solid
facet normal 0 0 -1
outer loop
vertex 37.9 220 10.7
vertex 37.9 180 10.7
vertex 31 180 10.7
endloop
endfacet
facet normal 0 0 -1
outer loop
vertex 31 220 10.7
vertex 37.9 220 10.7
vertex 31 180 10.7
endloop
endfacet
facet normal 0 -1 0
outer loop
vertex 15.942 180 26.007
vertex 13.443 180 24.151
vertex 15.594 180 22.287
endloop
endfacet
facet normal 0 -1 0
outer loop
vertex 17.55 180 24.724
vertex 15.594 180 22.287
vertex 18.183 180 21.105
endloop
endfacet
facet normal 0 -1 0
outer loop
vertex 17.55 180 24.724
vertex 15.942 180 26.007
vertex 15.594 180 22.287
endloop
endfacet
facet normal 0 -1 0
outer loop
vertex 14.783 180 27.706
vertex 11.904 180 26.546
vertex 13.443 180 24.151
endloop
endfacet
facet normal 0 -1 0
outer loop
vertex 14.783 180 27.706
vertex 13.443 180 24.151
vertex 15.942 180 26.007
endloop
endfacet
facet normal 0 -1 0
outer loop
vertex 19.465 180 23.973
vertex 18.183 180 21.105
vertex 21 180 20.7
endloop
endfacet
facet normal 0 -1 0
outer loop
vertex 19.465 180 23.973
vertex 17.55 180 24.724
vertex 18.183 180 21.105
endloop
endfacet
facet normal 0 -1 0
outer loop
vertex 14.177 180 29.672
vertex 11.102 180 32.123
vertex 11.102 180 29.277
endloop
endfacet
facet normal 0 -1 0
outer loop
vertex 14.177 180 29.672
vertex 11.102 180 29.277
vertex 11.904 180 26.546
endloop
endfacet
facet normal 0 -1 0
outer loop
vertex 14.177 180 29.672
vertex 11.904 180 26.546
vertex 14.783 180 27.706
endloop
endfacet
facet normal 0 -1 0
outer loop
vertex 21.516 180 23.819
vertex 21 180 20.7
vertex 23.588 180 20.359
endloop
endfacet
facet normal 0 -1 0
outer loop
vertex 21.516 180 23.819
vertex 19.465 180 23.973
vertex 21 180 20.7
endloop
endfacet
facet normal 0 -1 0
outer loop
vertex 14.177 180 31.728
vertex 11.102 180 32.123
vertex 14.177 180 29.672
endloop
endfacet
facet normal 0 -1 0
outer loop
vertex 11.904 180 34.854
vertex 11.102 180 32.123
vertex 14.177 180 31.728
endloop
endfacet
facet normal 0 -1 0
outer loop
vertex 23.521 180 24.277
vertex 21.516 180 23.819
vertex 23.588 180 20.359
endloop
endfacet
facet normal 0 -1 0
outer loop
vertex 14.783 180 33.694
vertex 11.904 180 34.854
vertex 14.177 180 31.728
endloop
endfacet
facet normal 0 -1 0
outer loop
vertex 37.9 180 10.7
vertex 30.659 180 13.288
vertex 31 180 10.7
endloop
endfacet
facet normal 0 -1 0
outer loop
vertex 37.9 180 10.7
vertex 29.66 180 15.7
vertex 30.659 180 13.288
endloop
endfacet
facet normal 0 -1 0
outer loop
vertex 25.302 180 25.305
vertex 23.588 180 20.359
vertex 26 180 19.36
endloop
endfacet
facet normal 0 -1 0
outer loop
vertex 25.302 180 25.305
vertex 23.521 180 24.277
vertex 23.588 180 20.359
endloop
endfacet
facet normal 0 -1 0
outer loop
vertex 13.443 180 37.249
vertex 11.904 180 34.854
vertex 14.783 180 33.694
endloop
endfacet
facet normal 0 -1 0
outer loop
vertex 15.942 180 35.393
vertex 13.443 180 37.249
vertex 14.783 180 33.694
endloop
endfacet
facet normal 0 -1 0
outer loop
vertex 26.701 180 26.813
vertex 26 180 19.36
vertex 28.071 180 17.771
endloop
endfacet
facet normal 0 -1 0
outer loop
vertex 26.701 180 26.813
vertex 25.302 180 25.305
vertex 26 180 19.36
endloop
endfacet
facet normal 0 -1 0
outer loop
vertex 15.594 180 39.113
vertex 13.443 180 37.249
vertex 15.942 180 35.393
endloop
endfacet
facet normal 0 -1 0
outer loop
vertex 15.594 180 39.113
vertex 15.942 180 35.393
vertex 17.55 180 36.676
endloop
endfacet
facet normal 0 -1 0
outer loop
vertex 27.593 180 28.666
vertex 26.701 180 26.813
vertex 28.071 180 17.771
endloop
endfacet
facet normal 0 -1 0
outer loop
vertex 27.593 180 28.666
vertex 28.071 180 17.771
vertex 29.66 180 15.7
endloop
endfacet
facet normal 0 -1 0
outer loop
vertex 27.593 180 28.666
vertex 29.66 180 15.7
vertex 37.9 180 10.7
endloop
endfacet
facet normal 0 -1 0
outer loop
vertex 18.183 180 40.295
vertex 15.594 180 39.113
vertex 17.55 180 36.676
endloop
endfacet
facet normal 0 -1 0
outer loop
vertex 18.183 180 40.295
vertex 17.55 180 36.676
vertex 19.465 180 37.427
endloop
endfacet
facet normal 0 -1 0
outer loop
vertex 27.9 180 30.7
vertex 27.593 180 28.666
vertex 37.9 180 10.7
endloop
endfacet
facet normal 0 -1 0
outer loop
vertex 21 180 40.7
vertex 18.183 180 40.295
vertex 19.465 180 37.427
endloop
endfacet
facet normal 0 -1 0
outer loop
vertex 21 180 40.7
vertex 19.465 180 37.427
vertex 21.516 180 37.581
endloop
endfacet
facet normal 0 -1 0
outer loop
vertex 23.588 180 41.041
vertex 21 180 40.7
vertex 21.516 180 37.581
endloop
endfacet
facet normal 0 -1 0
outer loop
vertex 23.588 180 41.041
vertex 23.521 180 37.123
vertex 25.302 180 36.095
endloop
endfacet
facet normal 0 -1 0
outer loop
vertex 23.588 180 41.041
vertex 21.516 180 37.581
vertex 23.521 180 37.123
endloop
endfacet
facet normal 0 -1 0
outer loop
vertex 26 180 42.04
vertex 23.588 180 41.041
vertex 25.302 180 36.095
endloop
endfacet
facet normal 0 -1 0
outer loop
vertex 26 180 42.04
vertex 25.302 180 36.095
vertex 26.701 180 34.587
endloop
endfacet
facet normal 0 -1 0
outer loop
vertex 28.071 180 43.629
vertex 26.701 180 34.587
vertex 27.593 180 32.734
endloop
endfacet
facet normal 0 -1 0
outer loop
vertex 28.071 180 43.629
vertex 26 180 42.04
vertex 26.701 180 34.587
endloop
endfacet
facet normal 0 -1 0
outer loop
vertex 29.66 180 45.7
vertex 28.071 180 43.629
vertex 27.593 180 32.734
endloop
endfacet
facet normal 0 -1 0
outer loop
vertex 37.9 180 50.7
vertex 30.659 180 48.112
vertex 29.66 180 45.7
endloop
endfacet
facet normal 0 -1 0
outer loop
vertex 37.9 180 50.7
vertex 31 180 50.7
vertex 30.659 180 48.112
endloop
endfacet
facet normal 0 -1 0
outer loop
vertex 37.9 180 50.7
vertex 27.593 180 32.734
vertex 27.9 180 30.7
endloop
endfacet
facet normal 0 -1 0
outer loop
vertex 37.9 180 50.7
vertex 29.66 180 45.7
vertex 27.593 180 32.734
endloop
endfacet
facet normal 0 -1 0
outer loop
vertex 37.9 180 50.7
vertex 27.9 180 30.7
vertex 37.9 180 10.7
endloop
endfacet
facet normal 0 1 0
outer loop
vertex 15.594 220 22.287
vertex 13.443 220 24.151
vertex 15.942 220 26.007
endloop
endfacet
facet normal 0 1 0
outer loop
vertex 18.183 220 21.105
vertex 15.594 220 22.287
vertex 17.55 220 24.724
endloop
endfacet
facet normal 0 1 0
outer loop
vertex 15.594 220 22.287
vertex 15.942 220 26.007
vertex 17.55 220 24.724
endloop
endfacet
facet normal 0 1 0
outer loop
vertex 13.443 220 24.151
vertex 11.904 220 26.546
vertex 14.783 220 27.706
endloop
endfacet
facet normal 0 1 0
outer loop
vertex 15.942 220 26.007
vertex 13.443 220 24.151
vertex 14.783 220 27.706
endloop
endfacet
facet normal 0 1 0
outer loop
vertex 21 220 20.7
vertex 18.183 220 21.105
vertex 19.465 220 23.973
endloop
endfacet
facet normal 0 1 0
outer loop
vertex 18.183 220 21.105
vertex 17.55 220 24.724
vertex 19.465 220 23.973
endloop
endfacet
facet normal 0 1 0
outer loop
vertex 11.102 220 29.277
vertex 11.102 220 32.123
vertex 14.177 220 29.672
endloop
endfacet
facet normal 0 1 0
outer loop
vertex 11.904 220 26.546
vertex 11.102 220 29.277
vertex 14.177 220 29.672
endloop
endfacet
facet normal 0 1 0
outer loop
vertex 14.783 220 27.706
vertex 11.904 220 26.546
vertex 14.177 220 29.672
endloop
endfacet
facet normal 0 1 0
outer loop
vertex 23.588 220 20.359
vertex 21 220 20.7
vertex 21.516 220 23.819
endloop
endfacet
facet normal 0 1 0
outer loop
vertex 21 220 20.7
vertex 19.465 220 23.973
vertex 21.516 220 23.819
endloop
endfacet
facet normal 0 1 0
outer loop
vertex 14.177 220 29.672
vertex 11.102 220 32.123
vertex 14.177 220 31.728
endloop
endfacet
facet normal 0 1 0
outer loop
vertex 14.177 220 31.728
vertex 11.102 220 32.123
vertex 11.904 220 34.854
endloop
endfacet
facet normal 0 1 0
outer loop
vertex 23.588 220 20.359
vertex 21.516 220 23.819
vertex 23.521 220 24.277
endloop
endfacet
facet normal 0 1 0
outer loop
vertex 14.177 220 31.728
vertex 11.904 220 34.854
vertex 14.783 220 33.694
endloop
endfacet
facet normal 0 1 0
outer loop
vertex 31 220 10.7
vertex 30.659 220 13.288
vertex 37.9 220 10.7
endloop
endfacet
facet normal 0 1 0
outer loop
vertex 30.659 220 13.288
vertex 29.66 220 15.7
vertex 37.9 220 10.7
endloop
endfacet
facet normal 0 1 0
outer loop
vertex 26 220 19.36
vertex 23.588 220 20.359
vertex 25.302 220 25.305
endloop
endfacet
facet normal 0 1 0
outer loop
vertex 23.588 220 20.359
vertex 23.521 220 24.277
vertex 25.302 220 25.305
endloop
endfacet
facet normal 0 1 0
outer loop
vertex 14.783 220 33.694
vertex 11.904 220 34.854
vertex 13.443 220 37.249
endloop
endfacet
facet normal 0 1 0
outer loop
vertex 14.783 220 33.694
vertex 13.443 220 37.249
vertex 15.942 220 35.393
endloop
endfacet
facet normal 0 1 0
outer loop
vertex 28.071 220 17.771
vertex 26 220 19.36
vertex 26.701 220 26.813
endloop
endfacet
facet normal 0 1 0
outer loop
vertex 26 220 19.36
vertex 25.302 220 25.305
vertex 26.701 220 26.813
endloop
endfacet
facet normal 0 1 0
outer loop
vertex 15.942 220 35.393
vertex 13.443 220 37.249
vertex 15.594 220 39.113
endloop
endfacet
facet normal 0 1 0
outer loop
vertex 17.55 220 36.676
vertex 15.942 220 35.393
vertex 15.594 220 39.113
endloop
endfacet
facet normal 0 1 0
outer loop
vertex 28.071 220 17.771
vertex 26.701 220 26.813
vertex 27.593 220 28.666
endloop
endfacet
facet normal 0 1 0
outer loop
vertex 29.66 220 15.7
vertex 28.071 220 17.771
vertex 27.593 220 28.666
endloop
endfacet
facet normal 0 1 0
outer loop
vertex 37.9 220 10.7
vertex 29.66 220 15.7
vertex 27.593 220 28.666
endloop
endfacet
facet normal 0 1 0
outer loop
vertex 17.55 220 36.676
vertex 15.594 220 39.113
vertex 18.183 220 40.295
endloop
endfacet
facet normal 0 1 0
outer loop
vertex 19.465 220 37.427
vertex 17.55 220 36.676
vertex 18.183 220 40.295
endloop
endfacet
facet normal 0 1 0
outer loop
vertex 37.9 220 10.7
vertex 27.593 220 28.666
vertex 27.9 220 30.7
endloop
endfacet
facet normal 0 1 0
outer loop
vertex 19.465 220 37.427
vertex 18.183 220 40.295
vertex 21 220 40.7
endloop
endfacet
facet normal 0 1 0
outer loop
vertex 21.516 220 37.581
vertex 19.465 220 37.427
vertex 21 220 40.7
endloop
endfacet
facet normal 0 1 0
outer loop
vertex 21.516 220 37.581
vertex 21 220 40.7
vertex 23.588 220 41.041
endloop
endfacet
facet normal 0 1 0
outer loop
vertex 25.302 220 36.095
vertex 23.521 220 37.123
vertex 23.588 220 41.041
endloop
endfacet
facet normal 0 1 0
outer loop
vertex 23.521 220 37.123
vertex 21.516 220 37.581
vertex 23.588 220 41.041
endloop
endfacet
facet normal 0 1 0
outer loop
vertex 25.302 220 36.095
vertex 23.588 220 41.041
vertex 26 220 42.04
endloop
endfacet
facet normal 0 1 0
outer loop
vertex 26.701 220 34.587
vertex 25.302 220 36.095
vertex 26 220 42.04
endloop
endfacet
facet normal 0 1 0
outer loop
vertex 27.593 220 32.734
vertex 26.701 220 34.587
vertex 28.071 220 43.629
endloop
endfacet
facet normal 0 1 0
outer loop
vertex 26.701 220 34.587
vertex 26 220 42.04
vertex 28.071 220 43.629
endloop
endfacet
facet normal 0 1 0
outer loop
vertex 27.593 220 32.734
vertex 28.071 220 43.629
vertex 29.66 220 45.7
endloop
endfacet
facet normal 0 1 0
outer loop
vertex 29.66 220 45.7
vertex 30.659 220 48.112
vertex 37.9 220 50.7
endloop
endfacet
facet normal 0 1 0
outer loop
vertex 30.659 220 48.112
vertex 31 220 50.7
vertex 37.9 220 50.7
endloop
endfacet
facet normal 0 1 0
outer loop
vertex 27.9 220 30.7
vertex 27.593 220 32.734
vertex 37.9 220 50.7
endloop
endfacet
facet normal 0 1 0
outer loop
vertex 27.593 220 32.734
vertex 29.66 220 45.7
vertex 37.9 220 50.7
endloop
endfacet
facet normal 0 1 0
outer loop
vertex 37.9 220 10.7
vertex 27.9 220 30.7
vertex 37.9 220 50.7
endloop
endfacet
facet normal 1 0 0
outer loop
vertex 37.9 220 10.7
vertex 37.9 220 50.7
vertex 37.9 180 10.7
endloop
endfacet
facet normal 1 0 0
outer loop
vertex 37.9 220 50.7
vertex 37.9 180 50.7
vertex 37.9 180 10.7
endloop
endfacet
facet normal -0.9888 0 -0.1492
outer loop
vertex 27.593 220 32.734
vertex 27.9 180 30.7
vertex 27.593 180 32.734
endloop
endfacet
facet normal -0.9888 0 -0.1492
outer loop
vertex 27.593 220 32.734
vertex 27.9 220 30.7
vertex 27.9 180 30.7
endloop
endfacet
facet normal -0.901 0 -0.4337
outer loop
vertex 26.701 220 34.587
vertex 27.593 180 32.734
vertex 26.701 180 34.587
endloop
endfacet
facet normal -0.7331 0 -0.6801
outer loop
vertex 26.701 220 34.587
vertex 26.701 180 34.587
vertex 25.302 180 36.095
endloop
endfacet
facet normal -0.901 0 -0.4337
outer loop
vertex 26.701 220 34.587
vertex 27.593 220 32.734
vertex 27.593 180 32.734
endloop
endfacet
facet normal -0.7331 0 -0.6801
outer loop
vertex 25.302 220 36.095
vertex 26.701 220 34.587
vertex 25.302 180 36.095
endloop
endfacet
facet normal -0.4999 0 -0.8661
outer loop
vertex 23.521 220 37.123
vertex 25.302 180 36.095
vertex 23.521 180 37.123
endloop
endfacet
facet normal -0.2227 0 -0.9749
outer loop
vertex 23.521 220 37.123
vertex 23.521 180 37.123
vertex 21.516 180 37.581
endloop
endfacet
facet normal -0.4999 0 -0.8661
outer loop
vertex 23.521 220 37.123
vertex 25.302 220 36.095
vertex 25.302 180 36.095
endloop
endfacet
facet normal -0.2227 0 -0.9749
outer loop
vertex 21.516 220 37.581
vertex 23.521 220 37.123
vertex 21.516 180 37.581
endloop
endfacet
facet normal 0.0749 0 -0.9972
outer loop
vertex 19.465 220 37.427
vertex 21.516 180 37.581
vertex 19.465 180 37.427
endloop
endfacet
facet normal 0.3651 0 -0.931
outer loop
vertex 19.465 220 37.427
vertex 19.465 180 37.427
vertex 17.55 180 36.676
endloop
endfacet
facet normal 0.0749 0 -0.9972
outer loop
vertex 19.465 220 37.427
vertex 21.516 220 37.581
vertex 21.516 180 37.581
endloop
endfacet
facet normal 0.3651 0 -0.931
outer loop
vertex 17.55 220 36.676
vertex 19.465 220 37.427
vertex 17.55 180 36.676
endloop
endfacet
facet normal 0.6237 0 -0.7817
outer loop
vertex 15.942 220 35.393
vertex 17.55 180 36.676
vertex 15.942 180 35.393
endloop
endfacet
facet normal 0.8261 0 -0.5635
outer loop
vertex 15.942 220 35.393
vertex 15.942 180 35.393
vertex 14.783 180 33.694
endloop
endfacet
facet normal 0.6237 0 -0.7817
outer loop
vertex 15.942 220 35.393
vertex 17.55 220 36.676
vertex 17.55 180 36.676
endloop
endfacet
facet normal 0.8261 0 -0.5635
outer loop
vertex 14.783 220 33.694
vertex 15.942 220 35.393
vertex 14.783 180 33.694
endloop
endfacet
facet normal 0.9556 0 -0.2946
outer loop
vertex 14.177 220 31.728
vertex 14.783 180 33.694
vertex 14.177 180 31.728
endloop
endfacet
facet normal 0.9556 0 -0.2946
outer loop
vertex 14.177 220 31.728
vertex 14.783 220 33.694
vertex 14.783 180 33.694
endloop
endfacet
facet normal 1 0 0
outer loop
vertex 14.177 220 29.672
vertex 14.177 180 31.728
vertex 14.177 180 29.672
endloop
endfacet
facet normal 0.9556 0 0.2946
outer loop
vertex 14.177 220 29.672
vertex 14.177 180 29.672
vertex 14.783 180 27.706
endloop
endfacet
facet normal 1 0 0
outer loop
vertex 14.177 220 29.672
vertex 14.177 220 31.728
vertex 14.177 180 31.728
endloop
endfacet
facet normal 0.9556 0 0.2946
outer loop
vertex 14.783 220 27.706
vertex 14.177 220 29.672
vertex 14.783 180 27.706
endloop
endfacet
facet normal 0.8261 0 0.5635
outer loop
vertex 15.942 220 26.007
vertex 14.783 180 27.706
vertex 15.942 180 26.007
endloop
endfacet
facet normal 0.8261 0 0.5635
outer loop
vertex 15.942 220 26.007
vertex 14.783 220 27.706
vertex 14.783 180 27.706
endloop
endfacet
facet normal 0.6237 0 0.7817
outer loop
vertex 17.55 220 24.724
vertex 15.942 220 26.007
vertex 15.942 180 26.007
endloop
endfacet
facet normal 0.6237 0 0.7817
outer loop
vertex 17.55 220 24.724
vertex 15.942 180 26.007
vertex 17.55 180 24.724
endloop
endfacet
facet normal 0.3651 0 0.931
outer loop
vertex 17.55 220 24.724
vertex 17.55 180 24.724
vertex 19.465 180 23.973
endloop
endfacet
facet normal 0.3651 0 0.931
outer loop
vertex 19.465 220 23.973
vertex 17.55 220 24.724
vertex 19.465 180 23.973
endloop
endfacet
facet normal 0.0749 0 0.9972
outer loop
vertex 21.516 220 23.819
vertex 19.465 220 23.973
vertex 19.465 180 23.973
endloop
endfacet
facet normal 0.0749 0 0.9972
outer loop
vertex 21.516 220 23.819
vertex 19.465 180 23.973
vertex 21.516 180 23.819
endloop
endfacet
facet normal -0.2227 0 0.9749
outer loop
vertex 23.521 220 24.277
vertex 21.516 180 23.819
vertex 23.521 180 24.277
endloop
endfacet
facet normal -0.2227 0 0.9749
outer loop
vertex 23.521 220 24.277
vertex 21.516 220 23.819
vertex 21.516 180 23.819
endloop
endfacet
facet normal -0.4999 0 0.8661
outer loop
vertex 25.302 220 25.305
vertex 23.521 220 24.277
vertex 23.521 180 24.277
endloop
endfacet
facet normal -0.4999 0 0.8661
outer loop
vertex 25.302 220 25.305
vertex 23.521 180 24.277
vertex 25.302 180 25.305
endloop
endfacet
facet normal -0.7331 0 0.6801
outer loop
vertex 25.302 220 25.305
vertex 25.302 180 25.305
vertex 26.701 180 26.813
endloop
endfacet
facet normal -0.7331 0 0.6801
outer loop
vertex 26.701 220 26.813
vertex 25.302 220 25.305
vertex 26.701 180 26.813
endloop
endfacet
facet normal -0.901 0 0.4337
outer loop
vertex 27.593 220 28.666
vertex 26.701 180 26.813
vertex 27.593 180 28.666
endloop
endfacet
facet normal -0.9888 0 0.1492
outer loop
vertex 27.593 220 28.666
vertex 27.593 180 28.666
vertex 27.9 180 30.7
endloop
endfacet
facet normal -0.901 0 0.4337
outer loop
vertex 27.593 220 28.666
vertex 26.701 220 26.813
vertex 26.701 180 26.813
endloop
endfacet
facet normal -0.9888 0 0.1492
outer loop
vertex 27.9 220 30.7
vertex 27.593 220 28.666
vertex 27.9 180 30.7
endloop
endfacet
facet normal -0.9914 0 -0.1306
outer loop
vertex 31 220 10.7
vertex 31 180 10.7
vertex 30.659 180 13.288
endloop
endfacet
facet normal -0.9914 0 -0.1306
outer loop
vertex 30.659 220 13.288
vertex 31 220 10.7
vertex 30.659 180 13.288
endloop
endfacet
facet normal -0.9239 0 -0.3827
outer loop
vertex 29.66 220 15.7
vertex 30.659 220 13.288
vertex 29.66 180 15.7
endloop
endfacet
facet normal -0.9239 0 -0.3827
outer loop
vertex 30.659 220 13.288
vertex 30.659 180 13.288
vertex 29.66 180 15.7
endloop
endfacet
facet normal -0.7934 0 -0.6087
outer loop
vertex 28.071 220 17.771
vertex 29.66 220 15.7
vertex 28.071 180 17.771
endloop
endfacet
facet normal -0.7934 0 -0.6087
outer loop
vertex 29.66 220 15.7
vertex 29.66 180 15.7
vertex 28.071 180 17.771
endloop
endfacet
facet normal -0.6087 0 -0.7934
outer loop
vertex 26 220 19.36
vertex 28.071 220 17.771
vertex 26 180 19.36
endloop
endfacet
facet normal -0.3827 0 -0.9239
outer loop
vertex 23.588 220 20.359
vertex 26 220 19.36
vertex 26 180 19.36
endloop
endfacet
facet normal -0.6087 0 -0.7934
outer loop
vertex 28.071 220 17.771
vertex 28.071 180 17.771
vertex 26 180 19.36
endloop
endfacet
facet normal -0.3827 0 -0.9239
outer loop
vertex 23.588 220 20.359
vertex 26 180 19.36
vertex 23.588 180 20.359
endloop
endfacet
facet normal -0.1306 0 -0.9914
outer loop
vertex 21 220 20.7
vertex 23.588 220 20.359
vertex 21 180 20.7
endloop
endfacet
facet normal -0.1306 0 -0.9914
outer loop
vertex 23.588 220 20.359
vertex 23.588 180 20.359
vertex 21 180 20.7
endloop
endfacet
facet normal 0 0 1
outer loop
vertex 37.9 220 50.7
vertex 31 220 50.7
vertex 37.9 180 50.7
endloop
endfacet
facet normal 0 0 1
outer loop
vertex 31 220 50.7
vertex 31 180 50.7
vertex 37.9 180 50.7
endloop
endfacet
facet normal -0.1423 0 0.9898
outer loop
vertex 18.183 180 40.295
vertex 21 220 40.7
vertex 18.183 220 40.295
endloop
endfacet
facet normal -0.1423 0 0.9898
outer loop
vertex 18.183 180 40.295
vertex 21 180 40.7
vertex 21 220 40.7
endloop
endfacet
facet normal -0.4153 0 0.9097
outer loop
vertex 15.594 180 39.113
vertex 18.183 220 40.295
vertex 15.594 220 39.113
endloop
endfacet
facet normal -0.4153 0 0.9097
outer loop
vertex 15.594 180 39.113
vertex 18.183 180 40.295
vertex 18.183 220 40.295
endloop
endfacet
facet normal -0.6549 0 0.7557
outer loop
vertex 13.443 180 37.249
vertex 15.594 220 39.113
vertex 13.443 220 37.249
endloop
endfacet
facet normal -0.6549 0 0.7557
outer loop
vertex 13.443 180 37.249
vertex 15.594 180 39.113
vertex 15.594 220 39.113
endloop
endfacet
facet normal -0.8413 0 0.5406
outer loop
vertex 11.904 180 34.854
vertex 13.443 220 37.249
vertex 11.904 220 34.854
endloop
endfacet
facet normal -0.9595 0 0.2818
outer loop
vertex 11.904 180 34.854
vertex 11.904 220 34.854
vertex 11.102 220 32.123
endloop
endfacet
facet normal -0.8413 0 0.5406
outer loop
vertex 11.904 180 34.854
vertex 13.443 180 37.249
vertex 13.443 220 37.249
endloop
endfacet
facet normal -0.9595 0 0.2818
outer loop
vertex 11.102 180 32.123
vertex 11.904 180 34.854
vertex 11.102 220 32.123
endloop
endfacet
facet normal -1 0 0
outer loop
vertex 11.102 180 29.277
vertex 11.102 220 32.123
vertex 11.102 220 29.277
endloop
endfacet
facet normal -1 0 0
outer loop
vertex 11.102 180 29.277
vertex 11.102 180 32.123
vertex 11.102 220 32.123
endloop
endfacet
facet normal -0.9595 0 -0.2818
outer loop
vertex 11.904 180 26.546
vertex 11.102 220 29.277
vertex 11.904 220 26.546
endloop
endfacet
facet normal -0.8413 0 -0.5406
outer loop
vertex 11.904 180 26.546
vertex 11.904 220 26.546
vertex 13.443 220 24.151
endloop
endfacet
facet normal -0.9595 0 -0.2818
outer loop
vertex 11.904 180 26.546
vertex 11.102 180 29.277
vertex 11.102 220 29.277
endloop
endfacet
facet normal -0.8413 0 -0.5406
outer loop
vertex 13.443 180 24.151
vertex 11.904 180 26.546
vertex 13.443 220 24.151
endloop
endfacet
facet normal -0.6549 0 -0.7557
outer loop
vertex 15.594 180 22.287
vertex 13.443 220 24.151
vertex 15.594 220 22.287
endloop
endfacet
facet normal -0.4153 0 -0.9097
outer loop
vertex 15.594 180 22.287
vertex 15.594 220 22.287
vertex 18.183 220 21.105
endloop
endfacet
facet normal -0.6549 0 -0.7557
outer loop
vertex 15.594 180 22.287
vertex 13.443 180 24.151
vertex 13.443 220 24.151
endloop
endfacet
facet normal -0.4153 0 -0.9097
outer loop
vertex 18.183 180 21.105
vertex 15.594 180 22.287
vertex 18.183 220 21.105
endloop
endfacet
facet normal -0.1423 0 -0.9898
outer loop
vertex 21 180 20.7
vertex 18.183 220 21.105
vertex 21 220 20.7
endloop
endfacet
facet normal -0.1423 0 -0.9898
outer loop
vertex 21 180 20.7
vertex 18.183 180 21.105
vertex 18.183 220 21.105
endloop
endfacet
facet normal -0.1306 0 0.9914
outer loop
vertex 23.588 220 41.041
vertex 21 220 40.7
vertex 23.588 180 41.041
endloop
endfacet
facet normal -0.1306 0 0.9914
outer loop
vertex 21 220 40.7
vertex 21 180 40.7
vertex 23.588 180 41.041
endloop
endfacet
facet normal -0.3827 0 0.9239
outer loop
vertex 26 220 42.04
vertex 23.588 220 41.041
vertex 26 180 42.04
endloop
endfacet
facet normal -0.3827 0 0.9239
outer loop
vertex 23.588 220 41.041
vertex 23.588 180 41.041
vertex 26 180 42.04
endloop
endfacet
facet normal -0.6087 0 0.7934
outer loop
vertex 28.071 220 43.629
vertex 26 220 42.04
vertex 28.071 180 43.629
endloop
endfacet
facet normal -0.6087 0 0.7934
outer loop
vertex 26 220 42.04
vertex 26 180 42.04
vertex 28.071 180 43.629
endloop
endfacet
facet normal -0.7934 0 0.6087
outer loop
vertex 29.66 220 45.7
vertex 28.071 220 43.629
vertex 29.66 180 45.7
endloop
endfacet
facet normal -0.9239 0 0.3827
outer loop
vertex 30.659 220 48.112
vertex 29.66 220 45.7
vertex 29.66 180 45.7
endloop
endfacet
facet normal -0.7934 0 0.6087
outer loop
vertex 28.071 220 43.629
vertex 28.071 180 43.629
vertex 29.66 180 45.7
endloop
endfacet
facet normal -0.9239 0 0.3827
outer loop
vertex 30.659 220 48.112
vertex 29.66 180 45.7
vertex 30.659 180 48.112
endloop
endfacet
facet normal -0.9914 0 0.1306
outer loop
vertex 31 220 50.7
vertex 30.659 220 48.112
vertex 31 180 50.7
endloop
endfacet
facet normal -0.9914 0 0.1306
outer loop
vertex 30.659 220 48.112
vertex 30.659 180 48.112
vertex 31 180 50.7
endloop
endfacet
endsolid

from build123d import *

# Parameters (mm, degrees)
SKETCH017_R  = 6.9
PAD007_DEPTH = 20


with BuildPart() as part:
    # Sketch017 → Pad007 (new body, symmetric)
    with BuildSketch(Plane.XZ.offset(-200)):
        with BuildLine():
            ThreePointArc((21, 40.7), (11, 30.7), (21, 20.7))
            ThreePointArc((31, 10.7), (28.071068, 17.771068), (21, 20.7))
            Line((37.9, 10.7), (31, 10.7))
            Line((37.9, 50.7), (37.9, 10.7))
            Line((31, 50.7), (37.9, 50.7))
            ThreePointArc((21, 40.7), (28.071068, 43.628932), (31, 50.7))
        make_face()
        with Locations((21, 30.7)):
            Circle(SKETCH017_R, mode=Mode.SUBTRACT)
    extrude(amount=PAD007_DEPTH, both=True)


solid = part.part
